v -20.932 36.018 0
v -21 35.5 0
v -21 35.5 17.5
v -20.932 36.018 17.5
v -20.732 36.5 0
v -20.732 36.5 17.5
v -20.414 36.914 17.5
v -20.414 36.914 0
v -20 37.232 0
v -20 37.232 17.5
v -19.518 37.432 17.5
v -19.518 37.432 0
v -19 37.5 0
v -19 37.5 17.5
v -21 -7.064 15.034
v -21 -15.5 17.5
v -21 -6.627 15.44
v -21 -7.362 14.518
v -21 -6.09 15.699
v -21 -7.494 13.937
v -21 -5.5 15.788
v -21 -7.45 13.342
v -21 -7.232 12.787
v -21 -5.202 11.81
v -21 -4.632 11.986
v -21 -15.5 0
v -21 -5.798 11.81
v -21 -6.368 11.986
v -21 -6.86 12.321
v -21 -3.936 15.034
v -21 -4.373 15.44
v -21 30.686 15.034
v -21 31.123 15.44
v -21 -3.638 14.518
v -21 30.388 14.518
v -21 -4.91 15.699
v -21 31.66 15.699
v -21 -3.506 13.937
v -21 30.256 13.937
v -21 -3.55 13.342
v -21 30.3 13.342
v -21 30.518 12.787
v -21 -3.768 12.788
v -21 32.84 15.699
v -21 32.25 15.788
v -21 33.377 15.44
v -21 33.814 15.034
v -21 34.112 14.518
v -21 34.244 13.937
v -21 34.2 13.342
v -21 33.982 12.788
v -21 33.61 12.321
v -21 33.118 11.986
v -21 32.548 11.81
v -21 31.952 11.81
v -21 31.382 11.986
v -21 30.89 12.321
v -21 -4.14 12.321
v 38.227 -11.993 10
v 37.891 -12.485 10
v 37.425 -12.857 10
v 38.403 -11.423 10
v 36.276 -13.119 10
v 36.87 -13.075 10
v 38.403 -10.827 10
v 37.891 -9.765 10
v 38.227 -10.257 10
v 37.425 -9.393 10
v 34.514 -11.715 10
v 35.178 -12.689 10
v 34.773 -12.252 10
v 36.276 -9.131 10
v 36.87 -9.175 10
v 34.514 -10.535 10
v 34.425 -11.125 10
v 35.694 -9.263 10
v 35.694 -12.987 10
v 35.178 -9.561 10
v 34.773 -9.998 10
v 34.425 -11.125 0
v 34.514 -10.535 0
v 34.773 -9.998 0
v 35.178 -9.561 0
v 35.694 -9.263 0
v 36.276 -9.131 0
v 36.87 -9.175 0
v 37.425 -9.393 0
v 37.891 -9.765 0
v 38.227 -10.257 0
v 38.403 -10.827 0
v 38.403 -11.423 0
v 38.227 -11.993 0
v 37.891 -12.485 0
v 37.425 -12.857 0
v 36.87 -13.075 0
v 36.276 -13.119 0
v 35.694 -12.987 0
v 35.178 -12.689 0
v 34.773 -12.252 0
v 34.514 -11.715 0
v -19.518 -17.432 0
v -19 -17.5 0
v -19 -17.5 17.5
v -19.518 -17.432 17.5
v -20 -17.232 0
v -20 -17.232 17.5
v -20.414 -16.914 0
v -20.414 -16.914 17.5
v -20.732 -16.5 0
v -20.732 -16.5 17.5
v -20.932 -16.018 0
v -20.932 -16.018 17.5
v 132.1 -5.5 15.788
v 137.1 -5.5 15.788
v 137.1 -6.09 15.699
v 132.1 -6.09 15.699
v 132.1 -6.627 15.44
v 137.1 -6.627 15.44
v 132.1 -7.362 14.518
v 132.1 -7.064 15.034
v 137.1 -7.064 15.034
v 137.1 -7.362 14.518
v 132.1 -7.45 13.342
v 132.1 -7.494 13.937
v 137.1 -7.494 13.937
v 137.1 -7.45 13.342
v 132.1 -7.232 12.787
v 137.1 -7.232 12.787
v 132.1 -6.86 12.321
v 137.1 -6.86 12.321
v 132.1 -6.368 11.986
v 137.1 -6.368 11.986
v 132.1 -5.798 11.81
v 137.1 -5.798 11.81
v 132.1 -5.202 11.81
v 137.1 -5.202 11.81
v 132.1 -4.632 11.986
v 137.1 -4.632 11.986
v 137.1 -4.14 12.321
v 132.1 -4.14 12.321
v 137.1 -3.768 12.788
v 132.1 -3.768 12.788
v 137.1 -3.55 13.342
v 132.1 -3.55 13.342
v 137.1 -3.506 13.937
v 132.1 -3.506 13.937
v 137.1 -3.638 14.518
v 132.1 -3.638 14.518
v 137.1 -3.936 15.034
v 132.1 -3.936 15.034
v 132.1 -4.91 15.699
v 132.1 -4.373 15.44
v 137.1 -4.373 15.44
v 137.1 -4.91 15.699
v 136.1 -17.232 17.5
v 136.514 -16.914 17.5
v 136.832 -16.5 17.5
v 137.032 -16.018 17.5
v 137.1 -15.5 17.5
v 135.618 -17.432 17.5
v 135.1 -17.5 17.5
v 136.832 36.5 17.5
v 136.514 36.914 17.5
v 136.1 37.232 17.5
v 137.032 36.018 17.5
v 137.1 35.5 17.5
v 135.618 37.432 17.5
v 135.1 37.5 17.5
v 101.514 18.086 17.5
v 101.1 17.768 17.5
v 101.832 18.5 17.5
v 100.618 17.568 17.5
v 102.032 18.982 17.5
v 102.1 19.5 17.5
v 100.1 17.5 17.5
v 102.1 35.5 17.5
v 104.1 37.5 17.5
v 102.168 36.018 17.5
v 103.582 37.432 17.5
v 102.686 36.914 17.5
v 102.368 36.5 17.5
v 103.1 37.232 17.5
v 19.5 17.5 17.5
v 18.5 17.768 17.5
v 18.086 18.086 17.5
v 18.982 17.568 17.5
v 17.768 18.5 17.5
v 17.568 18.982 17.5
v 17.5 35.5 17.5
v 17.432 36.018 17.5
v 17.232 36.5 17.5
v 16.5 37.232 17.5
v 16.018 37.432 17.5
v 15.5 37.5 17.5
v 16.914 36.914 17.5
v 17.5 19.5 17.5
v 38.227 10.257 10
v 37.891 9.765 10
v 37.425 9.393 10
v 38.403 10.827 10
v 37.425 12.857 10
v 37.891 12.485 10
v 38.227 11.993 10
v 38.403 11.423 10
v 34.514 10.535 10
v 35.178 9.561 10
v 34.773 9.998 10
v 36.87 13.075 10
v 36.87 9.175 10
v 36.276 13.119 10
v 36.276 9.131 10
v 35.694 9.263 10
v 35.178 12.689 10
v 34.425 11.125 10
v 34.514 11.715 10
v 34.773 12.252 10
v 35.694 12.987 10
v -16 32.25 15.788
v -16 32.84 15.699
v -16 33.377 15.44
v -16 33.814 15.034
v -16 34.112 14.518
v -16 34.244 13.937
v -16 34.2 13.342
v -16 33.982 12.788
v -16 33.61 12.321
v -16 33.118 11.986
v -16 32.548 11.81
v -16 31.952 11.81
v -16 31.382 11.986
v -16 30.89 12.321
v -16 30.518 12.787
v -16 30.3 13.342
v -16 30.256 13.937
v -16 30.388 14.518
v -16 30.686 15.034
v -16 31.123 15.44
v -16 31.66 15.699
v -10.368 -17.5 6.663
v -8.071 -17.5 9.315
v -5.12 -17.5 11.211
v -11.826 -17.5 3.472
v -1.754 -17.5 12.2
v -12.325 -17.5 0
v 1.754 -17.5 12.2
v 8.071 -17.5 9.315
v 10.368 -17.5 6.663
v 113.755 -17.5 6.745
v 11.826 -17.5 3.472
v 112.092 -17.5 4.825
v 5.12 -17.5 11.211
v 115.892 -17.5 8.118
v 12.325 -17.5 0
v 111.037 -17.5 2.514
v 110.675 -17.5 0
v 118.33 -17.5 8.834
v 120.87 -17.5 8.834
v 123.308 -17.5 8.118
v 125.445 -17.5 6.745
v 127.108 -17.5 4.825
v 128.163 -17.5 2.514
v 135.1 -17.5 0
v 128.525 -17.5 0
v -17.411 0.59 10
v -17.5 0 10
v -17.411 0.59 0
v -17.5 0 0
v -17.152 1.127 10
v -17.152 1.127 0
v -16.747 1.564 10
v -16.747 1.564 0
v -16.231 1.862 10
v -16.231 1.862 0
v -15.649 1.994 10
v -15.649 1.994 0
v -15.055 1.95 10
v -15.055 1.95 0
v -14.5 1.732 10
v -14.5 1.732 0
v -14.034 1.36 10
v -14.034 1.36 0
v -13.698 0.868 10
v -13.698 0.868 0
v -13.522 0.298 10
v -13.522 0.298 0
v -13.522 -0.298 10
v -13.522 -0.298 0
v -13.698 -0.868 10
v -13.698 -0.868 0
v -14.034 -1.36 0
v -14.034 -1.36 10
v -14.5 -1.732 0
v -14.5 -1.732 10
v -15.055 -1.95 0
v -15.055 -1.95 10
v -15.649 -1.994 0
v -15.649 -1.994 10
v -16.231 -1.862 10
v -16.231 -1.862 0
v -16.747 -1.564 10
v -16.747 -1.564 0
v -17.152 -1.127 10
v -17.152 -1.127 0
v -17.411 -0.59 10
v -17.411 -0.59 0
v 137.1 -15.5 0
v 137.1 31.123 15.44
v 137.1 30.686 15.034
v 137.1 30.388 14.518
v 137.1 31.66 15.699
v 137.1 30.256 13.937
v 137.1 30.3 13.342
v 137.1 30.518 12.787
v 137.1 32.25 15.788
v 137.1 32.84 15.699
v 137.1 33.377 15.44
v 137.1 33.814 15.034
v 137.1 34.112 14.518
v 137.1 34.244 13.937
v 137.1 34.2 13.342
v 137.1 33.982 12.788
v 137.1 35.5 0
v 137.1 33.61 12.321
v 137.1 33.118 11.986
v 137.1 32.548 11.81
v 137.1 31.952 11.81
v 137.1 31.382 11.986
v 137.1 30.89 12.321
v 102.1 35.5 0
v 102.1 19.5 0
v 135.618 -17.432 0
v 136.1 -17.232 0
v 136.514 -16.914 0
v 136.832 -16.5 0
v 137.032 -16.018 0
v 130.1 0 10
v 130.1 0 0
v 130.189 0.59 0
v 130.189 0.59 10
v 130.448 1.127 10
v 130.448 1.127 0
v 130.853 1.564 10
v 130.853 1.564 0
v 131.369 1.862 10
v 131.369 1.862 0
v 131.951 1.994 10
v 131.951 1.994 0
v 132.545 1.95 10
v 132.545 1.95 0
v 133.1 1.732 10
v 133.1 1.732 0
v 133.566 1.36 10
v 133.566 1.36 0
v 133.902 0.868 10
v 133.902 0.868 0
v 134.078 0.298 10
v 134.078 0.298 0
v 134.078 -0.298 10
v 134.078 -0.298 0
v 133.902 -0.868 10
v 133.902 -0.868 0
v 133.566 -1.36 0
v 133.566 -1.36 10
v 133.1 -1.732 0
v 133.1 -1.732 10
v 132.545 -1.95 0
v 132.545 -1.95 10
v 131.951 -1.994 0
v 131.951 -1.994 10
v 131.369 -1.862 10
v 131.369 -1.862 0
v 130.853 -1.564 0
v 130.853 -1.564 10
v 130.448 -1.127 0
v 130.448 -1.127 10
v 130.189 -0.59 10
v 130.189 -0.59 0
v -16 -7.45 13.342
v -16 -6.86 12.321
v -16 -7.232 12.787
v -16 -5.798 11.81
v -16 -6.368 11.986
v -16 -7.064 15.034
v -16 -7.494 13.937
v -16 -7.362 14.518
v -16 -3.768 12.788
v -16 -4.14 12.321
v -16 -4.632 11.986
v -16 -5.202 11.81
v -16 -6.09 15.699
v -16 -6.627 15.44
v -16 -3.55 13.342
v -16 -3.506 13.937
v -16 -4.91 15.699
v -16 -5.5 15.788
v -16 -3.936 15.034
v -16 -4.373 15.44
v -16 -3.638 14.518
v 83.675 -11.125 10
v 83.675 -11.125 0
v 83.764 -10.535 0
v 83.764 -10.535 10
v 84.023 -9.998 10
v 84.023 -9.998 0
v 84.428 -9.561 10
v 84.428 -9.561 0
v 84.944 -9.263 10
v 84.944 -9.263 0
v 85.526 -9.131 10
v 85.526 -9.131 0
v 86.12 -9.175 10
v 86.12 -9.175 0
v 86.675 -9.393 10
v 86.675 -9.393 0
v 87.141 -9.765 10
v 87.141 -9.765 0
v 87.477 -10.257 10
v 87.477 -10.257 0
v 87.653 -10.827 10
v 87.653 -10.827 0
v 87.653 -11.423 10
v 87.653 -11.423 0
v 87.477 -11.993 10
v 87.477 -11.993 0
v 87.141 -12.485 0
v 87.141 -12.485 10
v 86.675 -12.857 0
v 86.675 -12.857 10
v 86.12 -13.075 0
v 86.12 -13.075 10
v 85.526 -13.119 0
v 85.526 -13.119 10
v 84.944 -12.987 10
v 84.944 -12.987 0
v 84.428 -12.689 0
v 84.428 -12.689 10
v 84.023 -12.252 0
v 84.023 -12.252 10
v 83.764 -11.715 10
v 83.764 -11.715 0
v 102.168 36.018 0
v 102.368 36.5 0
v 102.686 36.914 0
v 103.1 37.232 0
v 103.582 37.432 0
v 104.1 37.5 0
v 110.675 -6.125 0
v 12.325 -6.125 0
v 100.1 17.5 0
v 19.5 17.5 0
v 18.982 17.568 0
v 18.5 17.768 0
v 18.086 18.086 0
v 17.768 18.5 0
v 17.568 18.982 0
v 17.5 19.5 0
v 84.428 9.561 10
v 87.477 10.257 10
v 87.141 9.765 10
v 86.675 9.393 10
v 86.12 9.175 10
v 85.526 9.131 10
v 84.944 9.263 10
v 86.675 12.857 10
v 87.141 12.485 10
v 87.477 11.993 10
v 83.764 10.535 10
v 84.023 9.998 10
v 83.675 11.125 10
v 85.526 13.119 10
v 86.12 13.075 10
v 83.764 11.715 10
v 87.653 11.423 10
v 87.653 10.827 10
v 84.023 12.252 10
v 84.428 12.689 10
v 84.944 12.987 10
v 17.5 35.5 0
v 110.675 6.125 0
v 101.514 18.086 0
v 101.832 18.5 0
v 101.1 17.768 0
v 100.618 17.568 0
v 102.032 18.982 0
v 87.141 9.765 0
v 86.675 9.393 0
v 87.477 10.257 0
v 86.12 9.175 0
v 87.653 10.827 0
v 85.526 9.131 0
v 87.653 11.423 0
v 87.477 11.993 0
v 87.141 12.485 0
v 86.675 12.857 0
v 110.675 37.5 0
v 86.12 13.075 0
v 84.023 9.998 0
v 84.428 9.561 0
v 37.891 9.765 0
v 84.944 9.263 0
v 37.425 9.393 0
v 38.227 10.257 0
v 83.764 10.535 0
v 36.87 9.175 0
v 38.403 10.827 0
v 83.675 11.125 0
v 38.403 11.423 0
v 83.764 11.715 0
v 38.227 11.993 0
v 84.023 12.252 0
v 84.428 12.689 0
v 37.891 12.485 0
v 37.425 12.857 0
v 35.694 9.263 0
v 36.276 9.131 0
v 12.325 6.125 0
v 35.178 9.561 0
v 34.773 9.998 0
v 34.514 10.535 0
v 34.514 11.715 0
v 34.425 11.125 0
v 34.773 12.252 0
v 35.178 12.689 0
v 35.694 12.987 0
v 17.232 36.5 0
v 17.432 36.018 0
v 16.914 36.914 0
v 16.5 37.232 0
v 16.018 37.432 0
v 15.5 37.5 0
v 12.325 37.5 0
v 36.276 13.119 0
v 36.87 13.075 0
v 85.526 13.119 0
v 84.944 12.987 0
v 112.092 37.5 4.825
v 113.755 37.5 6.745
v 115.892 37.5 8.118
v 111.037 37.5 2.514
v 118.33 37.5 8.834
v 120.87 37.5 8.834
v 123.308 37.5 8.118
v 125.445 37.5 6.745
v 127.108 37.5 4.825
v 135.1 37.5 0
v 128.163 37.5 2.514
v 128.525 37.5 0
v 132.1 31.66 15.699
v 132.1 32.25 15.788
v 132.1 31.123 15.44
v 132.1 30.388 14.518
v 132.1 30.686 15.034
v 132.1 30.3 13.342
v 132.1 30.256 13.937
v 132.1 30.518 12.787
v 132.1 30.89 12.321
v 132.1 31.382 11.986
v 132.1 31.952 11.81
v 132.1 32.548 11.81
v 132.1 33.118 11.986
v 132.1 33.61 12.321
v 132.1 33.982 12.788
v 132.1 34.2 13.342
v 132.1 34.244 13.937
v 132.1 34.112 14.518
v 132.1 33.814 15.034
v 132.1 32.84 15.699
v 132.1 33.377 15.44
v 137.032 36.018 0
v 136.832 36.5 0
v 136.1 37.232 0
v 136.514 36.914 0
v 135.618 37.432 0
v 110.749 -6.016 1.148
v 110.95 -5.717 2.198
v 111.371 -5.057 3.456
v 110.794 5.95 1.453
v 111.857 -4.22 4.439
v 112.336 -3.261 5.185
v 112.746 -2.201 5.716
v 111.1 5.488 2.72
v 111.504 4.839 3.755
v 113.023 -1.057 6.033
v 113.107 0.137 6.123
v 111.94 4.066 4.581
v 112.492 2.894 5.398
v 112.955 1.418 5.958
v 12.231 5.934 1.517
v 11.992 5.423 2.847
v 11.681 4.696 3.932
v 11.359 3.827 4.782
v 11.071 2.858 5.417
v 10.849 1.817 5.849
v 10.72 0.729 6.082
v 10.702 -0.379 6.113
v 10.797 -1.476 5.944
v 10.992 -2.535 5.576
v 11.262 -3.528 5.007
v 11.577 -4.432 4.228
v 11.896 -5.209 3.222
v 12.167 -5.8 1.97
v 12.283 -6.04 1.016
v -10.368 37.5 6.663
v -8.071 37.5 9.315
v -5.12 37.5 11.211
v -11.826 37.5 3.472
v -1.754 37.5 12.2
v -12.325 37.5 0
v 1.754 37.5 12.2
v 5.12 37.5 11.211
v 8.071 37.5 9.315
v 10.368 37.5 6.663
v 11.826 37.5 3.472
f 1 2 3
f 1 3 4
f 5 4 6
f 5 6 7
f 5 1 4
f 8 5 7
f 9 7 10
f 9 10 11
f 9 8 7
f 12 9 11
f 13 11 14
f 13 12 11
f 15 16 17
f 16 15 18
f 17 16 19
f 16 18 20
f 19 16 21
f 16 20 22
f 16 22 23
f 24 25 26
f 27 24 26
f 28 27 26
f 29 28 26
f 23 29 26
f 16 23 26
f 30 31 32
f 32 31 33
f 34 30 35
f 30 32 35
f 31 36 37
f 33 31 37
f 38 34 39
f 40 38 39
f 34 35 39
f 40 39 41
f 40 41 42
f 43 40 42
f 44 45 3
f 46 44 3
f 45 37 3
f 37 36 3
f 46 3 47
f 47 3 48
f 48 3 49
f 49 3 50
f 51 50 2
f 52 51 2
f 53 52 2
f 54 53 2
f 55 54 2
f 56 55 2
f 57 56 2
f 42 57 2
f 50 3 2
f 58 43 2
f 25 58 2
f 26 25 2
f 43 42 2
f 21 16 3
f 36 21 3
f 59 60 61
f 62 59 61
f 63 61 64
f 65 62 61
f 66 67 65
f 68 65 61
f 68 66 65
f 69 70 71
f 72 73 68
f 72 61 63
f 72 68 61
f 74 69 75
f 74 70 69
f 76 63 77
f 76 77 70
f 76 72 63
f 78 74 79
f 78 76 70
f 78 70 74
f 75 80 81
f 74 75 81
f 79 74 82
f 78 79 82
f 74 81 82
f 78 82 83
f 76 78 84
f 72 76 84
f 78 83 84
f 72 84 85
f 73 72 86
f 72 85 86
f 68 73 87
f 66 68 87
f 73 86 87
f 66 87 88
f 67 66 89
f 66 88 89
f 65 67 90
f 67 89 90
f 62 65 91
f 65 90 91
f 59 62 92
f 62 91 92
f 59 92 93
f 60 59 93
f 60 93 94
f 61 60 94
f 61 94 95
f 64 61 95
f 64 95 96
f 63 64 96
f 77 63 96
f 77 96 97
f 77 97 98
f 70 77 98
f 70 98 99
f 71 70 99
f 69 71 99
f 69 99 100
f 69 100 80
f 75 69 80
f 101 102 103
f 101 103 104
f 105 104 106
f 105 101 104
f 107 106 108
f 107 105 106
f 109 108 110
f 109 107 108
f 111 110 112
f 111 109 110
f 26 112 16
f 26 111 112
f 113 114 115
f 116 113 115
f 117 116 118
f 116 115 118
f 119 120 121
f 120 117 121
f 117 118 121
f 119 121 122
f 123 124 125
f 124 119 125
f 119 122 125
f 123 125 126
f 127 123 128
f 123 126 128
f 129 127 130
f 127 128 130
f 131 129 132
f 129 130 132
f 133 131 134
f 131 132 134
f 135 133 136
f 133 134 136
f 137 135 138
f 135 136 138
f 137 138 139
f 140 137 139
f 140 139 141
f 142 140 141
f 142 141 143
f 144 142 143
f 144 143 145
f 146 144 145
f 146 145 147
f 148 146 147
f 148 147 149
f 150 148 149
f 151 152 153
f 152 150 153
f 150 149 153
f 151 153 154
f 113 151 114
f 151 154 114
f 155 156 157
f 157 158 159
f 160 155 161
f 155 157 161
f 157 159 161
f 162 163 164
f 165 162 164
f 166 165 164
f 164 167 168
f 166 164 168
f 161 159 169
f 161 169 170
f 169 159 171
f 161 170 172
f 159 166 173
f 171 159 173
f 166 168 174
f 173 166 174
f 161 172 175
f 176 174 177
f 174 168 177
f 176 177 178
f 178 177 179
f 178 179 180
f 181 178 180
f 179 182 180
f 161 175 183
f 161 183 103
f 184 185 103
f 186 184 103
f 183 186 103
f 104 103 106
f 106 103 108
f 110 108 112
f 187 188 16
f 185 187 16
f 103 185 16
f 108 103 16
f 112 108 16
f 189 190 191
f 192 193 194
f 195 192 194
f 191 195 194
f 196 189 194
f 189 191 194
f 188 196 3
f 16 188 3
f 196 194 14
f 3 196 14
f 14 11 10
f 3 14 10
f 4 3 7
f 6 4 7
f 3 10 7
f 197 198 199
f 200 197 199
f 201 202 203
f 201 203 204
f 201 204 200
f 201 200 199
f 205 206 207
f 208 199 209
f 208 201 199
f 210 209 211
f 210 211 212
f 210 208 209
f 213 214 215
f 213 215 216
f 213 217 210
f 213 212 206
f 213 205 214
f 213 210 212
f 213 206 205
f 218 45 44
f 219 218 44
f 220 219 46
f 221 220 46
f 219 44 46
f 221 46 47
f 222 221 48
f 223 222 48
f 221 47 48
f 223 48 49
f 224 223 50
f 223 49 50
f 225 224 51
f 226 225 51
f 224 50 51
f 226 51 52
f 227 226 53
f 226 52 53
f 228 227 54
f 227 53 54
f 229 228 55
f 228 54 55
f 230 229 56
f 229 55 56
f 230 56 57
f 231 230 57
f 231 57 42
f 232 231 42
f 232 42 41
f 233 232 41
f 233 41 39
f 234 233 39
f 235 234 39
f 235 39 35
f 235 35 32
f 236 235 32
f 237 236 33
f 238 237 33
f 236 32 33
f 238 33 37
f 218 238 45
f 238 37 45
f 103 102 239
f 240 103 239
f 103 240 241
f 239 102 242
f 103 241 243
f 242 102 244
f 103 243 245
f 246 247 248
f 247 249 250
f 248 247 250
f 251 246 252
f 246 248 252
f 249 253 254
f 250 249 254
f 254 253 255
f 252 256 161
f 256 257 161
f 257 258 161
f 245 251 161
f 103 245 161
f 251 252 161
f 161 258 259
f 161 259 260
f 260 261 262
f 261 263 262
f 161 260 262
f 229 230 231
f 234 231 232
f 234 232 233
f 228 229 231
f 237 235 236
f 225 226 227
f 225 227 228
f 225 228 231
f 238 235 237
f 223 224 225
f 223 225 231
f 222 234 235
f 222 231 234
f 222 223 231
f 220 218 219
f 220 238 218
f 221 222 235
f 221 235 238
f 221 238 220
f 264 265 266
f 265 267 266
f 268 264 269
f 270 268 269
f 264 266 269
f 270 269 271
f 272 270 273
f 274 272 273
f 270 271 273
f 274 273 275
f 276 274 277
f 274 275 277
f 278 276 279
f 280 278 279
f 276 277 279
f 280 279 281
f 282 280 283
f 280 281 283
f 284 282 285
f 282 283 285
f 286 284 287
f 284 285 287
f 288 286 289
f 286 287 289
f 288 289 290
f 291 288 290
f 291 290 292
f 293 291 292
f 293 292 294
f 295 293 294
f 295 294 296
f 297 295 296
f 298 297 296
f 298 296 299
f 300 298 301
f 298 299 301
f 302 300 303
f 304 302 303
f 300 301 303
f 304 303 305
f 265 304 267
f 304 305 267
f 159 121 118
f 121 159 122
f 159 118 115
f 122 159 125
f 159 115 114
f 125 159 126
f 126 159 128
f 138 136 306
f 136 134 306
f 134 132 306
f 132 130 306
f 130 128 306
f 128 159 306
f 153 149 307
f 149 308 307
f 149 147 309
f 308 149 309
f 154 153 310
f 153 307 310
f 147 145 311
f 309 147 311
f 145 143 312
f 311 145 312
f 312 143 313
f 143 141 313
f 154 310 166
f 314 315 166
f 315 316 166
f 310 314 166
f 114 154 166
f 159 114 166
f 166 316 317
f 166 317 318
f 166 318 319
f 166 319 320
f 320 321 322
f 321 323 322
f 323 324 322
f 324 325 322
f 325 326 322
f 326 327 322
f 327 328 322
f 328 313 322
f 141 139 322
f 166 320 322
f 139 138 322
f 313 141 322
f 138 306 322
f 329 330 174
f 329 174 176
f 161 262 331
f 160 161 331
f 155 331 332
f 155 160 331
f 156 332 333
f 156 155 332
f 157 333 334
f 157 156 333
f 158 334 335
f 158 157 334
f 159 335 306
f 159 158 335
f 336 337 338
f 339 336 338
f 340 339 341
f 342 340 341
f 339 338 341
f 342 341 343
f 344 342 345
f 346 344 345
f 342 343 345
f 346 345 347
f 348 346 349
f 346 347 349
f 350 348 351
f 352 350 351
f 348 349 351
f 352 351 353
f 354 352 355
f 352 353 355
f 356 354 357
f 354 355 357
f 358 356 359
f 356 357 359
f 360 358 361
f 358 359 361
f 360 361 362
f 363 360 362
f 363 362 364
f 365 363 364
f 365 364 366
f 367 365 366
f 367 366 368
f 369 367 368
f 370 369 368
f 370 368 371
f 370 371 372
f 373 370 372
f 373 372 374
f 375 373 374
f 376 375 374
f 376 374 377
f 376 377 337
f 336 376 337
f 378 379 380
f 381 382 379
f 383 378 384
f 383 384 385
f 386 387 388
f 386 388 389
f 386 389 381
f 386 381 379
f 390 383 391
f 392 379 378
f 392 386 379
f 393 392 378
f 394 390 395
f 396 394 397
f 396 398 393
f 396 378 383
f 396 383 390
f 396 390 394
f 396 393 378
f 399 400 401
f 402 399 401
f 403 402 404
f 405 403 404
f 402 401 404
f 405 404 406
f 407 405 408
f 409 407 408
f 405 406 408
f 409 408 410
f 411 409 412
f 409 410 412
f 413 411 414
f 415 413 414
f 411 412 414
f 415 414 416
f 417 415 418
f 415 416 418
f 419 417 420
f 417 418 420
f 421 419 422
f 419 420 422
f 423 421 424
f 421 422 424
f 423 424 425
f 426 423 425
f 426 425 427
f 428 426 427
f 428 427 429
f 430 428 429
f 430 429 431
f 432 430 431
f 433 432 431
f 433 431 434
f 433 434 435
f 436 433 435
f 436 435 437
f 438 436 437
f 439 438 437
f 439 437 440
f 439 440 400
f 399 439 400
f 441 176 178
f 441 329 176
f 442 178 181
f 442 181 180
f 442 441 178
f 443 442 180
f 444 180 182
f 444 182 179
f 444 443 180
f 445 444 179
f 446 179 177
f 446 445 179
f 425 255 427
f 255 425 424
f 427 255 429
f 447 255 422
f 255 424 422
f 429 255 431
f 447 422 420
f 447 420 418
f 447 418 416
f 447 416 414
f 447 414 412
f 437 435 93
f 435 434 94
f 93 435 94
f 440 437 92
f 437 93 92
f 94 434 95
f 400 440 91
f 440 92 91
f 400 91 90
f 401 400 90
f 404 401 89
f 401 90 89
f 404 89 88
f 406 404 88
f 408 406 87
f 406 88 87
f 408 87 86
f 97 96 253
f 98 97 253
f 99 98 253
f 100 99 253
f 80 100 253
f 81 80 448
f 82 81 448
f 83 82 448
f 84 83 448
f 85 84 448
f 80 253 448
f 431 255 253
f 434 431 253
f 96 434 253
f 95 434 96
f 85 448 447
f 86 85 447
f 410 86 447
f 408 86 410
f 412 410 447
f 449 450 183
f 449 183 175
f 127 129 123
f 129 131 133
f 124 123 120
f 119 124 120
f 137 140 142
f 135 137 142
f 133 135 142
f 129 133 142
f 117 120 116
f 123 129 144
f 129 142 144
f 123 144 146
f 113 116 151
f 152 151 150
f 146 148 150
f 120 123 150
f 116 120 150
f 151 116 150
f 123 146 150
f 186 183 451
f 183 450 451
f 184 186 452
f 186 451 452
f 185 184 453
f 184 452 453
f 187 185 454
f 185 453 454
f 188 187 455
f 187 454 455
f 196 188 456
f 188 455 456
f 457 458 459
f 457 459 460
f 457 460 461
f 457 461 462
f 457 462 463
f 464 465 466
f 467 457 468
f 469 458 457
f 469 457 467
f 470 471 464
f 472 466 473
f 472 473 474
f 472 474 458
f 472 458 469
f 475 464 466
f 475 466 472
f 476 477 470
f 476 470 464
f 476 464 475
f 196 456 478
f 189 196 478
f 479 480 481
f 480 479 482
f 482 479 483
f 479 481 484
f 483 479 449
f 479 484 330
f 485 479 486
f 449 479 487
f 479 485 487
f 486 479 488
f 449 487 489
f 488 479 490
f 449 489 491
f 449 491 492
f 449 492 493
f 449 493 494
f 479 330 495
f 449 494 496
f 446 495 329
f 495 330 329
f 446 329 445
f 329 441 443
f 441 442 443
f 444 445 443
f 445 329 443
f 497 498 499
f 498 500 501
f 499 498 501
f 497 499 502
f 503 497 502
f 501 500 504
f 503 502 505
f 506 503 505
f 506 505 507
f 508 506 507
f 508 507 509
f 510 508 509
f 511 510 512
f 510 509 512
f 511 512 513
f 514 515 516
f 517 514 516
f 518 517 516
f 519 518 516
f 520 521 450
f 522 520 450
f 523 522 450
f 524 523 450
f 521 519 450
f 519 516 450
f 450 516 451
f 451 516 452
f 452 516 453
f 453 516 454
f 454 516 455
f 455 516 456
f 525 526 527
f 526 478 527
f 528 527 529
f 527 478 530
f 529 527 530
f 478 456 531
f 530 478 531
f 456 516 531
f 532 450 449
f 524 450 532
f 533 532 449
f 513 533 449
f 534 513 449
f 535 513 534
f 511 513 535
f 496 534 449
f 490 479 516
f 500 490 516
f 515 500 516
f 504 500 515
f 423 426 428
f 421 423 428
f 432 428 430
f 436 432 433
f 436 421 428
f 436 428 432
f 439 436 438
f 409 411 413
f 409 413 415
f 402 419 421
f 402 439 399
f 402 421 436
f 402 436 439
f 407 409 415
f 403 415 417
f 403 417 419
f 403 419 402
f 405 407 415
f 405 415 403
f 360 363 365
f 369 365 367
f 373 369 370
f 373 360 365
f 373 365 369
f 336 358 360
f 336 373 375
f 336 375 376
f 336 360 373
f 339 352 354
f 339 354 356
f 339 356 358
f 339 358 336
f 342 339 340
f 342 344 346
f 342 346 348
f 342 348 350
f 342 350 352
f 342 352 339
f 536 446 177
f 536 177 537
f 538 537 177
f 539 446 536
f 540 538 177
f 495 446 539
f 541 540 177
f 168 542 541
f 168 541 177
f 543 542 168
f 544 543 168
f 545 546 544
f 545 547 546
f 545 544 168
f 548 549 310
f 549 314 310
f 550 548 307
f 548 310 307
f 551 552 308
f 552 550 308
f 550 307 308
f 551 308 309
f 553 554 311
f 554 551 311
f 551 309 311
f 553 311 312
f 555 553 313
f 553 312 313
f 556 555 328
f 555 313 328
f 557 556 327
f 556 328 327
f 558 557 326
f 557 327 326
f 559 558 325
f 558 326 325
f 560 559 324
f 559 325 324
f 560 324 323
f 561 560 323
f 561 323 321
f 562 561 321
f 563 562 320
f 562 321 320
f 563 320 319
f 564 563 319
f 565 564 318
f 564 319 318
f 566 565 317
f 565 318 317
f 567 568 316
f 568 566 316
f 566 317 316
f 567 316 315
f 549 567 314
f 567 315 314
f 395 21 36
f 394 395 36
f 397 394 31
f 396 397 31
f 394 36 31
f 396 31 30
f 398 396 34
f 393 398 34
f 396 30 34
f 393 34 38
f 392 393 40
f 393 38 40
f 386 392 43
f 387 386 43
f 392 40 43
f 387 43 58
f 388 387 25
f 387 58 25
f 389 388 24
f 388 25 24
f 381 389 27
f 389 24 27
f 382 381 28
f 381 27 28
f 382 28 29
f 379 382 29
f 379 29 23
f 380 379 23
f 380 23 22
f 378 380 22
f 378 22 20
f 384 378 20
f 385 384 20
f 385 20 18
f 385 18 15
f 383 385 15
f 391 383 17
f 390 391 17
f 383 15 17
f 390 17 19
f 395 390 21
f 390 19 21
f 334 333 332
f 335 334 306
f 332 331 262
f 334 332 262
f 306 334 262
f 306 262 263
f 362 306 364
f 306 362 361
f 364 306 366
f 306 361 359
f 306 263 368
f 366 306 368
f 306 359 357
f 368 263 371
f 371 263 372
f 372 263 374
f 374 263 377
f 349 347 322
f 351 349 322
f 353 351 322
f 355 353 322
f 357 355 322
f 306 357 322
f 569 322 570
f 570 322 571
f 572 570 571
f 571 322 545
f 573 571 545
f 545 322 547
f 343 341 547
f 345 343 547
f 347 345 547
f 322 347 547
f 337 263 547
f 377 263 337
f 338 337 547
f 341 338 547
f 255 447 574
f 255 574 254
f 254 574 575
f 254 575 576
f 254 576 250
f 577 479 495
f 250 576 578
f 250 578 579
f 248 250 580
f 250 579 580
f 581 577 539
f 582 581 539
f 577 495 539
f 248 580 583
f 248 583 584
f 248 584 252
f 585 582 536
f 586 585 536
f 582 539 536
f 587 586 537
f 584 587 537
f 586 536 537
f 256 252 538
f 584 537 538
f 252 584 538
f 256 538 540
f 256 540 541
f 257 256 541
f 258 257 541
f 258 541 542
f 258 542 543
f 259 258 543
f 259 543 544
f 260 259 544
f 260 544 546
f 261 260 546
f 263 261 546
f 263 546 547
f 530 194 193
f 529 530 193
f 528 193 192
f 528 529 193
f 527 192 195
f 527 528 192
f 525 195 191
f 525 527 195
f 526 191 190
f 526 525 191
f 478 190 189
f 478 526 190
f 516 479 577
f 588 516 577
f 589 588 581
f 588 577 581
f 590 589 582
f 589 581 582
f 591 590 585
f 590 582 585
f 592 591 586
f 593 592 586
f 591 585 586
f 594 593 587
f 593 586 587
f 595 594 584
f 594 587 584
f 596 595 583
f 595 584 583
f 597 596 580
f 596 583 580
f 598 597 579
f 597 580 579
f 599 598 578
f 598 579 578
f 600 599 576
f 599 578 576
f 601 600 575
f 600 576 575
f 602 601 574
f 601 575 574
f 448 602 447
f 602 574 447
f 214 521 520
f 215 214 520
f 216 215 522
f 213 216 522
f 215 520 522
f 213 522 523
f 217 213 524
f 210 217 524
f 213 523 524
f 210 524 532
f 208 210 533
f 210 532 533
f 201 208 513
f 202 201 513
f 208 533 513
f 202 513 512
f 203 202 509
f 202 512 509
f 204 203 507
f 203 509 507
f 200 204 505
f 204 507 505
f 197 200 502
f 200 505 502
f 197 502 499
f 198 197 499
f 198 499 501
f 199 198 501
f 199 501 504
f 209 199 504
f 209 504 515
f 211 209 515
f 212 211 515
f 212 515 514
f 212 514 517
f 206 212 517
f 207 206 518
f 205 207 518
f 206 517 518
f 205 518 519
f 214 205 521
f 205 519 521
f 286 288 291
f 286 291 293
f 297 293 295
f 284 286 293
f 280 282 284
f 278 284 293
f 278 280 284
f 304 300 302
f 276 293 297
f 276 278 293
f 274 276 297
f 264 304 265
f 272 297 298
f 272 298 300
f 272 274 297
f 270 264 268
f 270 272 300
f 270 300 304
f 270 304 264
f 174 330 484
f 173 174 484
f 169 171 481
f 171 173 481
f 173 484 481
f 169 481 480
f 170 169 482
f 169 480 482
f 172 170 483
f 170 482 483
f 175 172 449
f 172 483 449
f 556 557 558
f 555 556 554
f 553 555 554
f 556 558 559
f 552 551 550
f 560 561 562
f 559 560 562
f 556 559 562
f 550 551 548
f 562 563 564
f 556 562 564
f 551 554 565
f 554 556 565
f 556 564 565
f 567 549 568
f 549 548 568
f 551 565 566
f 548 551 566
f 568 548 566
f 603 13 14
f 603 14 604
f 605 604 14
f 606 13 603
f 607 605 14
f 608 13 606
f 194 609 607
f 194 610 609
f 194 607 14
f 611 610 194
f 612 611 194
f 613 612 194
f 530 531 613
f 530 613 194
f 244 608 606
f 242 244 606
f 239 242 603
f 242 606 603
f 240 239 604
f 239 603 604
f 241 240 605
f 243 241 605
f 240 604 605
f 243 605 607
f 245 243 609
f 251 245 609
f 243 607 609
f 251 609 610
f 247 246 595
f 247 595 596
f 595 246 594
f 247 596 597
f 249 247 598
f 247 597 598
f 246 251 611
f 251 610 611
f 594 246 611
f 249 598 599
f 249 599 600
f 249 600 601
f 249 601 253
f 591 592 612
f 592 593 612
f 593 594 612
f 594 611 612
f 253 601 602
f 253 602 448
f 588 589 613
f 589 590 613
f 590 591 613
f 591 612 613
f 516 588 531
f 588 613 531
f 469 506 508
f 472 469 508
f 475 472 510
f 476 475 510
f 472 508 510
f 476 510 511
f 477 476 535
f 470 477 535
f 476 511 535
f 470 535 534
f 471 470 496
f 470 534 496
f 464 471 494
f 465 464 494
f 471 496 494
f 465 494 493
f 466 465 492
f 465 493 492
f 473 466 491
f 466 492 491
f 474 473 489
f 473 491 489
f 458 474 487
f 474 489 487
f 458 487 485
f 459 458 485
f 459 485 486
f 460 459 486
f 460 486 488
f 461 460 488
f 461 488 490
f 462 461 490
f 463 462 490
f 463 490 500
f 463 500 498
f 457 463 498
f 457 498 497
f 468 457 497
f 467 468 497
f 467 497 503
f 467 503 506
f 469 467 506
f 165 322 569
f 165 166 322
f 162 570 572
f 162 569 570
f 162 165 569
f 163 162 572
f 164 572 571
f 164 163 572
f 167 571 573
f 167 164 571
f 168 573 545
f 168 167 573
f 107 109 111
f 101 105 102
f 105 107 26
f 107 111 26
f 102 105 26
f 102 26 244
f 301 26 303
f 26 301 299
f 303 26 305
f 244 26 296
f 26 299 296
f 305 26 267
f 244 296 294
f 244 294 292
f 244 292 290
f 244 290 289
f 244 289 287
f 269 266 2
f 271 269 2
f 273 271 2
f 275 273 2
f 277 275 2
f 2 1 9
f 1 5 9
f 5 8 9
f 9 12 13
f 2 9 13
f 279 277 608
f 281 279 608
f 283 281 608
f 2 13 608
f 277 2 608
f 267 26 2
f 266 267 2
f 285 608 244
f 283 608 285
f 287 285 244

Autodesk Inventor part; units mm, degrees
ref_plane "YZ Plane" through (0, 0, 0) normal (1, 0, 0) x (0, 1, 0)
ref_plane "XZ Plane" through (0, 0, 0) normal (0, 1, 0) x (-1, 0, 0)
ref_plane "XY Plane" through (0, 0, 0) normal (0, 0, 1) x (1, 0, 0)
sketch "Sketch1" plane through (0, 0, 0) normal (0, 0, 1) x (1, 0, 0)
  line L0 (0, 0) -> (119.6, 0)
  line L1 (119.6, 0) -> (119.6, 150)
  line L2 (119.6, 150) -> (0, 150)
  line L3 (0, 150) -> (0, 0)
  dimension "d0" = 119.6
  dimension "d1" = 150
sketch "Sketch2" plane through (0, 0, 0) normal (1, 0, 0) x (0, 1, 0)
  circle A0 centre (0, 0) radius 12.5
  circle A1 centre (0, 0) radius 6.125
  line L0 (-12.5, 0) -> (12.5, 0)
  line L1 (12.5, 0) -> (12.5, 12.5)
  line L2 (12.5, 12.5) -> (-12.5, 12.5)
  line L3 (-12.5, 12.5) -> (-12.5, 0)
  circle A2 centre (150, 0) radius 12.5
  circle A3 centre (150, 0) radius 6.125
  line L4 (137.5, 0) -> (162.5, 0)
  line L5 (162.5, 0) -> (162.5, 12.5)
  line L6 (162.5, 12.5) -> (137.5, 12.5)
  line L7 (137.5, 12.5) -> (137.5, 0)
  line L8 (-12.5, 12.5) -> (-17.5, 12.5)
  line L9 (-17.5, 12.5) -> (-17.5, 0)
  line L10 (-17.5, 0) -> (-12.5, 0)
  line L11 (-12.5, 0) -> (-12.5, 12.5)
  line L12 (12.5, 12.5) -> (17.5, 12.5)
  line L13 (17.5, 12.5) -> (17.5, 0)
  line L14 (17.5, 0) -> (12.5, 0)
  line L15 (12.5, 0) -> (12.5, 12.5)
  point P0 (6.125, 0)
  point P1 (-6.125, 0)
  point P2 (150, 0)
  point P3 (12.5, 0)
  dimension "d2" = 25
  dimension "d3" = 12.25
  dimension "d6" = 5
  dimension "d7" = 5
  dimension "d8" = 35
extrude "Extrusion1" add sketch "Sketch2" along normal up to surface (119.6 mm away) contours L3 L2 A0 | A0 L0 A1 | L10 L9 L8 L3 | A0 L2 L1 | L1 L12 L13 L14 | A1 L0 picked at (10.2705, 0.9272) picked at (1.5282, 2.3311)
ref_plane "Work Plane1" through (59.8, 0, 0) normal (-1, 0, 0) x (0, 0, 1)
sketch "Sketch3" plane through (0, -17.5, 0) normal (0, -1, 0) x (1, 0, 0)
  line L0 (0, 12.5) -> (119.6, 12.5) projected
  line L1 (102.1, 12.5) -> (137.1, 12.5)
  line L2 (137.1, 12.5) -> (137.1, 0)
  line L3 (137.1, 0) -> (102.1, 0)
  line L4 (102.1, 0) -> (102.1, 12.5)
  line L5 (119.6, 12.5) -> (119.6, 0) projected
  circle A0 centre (119.6, 0) radius 8.925
  point P0 (0, 0)
  point P1 (119.6, 12.5)
  point P2 (128.525, 0)
  point P3 (110.675, 0)
  dimension "d9" = 35
  dimension "d33" = 17.85
extrude "Extrusion2" add sketch "Sketch3" against normal blind 55 contours L0 L5 A0 L3 L4 | L1 L2 L3 A0 L5 | A0 L3 L5 | L5 L3 A0
extrude "Extrusion4" cut sketch "Sketch3" along normal through all both and the other way through all contours A0 L3 L5 | L5 L3 A0
extrude "Extrusion3" cut sketch "Sketch2" along normal up to surface (119.6 mm away) contours A1 L0 picked at (1.5282, 2.3311)
mirror "Mirror1" about plane through (59.8, 0, 0) normal (-1, 0, 0) of "Extrusion2", "Extrusion4", "Extrusion3"
sketch "Sketch4" plane through (102.1, 17.5, 12.5) normal (0, 0, 1) x (1, 0, 0)
  line L0 (-119.6, -35) -> (35, -35) projected
  line L1 (0, 20) -> (35, 20) projected
  line L2 (0, 0) -> (0, 20) projected
  line L3 (-84.6, 0) -> (0, 0) projected
  line L4 (-84.6, 0) -> (-84.6, 20) projected
  line L5 (-84.6, 20) -> (-119.6, 20) projected
  line L6 (35, -35) -> (35, 20) projected
  line L7 (-119.6, -35) -> (-119.6, 20) projected
  point P0 (-102.1, -17.5)
extrude "Extrusion5" add sketch "Sketch4" along normal blind 5
sketch "Sketch5" plane through (102.1, 17.5, 0) normal (0, 0, -1) x (-1, 0, 0)
  circle A0 centre (16.425, -6.375) radius 2
  line L0 (-8.575, -11.375) -> (93.175, -11.375) projected
  line L1 (-8.575, 20) -> (-8.575, -11.375) projected
  circle A1 centre (65.675, -6.375) radius 2
  circle A2 centre (16.425, -28.625) radius 2
  circle A3 centre (65.675, -28.625) radius 2
  line L2 (93.175, -35) -> (93.175, -23.625) projected
  line L3 (93.175, -23.625) -> (-8.575, -23.625) projected
  circle A4 centre (-30, -17.5) radius 2
  circle A5 centre (117.6, -17.5) radius 2
  line L4 (-35, -35) -> (-35, 20) projected
  line L5 (119.6, -35) -> (119.6, 20) projected
  line L6 (16.425, -6.375) -> (16.425, -28.625) construction
  point P0 (102.1, -17.5)
  point P1 (16.425, -17.5)
  dimension "d18" = 4
  dimension "d19" = 5
  dimension "d20" = 25
  dimension "d23" = 49.25
  dimension "d26" = 22.25
  dimension "d29" = 27.5
  dimension "d30" = 5
  dimension "d38" = 5
  dimension "d39" = 2
extrude "Extrusion6" cut sketch "Sketch5" against normal blind 10
sketch "Sketch6" plane through (0, 37.5, 0) normal (0, 1, 0) x (1, 0, 0)
  circle A0 centre (0, 0) radius 12.325
  line L0 (-17.5, 0) -> (-17.5, -17.5) projected
  line L1 (-17.5, -17.5) -> (-21, -17.5)
  line L2 (-21, -17.5) -> (-21, 0)
  line L3 (-21, 0) -> (-17.5, 0)
  line L4 (-17.5, 0) -> (-17.5, -17.5)
  line L5 (-17.5, 0) -> (-8.925, 0) projected
  dimension "d34" = 24.65
  dimension "d40" = 3.5
extrude "Extrusion7" cut sketch "Sketch6" against normal through all contours A0
extrude "Extrusion8" add sketch "Sketch6" against normal up to surface (55 mm away) contours L0 L1 L2 L3
fillet "Fillet1" radius 2 8 edges at (102.1, 17.5, 8.75) (17.5, 17.5, 8.75) (17.5, 37.5, 8.75) (102.1, 37.5, 8.75) (137.1, 37.5, 8.75) (137.1, -17.5, 8.75) (-21, 37.5, 8.75) (-21, -17.5, 8.75)
sketch "Sketch7" plane through (-21, -15.5, 17.5) normal (-1, 0, 0) x (0, 0, 1)
  circle A0 centre (-3.7125, 10) radius 2
  line L0 (0, 51) -> (0, 0) projected
  line L1 (-17.5, -2) -> (0, -2) projected
  circle A1 centre (-3.7125, 47.75) radius 2
  point P0 (-17.5, 15.5)
  dimension "d43" = 4
  dimension "d44" = 3.7125
  dimension "d45" = 12
  dimension "d49" = 37.75
extrude "Extrusion9" cut sketch "Sketch7" against normal blind 5
extrude "Extrusion10" cut sketch "Sketch7" along normal blind 5 from surface at -158.1
equation "\"d7\" = d6"
equation "\"d9\" = d8"
properties part number "BottomBase"
